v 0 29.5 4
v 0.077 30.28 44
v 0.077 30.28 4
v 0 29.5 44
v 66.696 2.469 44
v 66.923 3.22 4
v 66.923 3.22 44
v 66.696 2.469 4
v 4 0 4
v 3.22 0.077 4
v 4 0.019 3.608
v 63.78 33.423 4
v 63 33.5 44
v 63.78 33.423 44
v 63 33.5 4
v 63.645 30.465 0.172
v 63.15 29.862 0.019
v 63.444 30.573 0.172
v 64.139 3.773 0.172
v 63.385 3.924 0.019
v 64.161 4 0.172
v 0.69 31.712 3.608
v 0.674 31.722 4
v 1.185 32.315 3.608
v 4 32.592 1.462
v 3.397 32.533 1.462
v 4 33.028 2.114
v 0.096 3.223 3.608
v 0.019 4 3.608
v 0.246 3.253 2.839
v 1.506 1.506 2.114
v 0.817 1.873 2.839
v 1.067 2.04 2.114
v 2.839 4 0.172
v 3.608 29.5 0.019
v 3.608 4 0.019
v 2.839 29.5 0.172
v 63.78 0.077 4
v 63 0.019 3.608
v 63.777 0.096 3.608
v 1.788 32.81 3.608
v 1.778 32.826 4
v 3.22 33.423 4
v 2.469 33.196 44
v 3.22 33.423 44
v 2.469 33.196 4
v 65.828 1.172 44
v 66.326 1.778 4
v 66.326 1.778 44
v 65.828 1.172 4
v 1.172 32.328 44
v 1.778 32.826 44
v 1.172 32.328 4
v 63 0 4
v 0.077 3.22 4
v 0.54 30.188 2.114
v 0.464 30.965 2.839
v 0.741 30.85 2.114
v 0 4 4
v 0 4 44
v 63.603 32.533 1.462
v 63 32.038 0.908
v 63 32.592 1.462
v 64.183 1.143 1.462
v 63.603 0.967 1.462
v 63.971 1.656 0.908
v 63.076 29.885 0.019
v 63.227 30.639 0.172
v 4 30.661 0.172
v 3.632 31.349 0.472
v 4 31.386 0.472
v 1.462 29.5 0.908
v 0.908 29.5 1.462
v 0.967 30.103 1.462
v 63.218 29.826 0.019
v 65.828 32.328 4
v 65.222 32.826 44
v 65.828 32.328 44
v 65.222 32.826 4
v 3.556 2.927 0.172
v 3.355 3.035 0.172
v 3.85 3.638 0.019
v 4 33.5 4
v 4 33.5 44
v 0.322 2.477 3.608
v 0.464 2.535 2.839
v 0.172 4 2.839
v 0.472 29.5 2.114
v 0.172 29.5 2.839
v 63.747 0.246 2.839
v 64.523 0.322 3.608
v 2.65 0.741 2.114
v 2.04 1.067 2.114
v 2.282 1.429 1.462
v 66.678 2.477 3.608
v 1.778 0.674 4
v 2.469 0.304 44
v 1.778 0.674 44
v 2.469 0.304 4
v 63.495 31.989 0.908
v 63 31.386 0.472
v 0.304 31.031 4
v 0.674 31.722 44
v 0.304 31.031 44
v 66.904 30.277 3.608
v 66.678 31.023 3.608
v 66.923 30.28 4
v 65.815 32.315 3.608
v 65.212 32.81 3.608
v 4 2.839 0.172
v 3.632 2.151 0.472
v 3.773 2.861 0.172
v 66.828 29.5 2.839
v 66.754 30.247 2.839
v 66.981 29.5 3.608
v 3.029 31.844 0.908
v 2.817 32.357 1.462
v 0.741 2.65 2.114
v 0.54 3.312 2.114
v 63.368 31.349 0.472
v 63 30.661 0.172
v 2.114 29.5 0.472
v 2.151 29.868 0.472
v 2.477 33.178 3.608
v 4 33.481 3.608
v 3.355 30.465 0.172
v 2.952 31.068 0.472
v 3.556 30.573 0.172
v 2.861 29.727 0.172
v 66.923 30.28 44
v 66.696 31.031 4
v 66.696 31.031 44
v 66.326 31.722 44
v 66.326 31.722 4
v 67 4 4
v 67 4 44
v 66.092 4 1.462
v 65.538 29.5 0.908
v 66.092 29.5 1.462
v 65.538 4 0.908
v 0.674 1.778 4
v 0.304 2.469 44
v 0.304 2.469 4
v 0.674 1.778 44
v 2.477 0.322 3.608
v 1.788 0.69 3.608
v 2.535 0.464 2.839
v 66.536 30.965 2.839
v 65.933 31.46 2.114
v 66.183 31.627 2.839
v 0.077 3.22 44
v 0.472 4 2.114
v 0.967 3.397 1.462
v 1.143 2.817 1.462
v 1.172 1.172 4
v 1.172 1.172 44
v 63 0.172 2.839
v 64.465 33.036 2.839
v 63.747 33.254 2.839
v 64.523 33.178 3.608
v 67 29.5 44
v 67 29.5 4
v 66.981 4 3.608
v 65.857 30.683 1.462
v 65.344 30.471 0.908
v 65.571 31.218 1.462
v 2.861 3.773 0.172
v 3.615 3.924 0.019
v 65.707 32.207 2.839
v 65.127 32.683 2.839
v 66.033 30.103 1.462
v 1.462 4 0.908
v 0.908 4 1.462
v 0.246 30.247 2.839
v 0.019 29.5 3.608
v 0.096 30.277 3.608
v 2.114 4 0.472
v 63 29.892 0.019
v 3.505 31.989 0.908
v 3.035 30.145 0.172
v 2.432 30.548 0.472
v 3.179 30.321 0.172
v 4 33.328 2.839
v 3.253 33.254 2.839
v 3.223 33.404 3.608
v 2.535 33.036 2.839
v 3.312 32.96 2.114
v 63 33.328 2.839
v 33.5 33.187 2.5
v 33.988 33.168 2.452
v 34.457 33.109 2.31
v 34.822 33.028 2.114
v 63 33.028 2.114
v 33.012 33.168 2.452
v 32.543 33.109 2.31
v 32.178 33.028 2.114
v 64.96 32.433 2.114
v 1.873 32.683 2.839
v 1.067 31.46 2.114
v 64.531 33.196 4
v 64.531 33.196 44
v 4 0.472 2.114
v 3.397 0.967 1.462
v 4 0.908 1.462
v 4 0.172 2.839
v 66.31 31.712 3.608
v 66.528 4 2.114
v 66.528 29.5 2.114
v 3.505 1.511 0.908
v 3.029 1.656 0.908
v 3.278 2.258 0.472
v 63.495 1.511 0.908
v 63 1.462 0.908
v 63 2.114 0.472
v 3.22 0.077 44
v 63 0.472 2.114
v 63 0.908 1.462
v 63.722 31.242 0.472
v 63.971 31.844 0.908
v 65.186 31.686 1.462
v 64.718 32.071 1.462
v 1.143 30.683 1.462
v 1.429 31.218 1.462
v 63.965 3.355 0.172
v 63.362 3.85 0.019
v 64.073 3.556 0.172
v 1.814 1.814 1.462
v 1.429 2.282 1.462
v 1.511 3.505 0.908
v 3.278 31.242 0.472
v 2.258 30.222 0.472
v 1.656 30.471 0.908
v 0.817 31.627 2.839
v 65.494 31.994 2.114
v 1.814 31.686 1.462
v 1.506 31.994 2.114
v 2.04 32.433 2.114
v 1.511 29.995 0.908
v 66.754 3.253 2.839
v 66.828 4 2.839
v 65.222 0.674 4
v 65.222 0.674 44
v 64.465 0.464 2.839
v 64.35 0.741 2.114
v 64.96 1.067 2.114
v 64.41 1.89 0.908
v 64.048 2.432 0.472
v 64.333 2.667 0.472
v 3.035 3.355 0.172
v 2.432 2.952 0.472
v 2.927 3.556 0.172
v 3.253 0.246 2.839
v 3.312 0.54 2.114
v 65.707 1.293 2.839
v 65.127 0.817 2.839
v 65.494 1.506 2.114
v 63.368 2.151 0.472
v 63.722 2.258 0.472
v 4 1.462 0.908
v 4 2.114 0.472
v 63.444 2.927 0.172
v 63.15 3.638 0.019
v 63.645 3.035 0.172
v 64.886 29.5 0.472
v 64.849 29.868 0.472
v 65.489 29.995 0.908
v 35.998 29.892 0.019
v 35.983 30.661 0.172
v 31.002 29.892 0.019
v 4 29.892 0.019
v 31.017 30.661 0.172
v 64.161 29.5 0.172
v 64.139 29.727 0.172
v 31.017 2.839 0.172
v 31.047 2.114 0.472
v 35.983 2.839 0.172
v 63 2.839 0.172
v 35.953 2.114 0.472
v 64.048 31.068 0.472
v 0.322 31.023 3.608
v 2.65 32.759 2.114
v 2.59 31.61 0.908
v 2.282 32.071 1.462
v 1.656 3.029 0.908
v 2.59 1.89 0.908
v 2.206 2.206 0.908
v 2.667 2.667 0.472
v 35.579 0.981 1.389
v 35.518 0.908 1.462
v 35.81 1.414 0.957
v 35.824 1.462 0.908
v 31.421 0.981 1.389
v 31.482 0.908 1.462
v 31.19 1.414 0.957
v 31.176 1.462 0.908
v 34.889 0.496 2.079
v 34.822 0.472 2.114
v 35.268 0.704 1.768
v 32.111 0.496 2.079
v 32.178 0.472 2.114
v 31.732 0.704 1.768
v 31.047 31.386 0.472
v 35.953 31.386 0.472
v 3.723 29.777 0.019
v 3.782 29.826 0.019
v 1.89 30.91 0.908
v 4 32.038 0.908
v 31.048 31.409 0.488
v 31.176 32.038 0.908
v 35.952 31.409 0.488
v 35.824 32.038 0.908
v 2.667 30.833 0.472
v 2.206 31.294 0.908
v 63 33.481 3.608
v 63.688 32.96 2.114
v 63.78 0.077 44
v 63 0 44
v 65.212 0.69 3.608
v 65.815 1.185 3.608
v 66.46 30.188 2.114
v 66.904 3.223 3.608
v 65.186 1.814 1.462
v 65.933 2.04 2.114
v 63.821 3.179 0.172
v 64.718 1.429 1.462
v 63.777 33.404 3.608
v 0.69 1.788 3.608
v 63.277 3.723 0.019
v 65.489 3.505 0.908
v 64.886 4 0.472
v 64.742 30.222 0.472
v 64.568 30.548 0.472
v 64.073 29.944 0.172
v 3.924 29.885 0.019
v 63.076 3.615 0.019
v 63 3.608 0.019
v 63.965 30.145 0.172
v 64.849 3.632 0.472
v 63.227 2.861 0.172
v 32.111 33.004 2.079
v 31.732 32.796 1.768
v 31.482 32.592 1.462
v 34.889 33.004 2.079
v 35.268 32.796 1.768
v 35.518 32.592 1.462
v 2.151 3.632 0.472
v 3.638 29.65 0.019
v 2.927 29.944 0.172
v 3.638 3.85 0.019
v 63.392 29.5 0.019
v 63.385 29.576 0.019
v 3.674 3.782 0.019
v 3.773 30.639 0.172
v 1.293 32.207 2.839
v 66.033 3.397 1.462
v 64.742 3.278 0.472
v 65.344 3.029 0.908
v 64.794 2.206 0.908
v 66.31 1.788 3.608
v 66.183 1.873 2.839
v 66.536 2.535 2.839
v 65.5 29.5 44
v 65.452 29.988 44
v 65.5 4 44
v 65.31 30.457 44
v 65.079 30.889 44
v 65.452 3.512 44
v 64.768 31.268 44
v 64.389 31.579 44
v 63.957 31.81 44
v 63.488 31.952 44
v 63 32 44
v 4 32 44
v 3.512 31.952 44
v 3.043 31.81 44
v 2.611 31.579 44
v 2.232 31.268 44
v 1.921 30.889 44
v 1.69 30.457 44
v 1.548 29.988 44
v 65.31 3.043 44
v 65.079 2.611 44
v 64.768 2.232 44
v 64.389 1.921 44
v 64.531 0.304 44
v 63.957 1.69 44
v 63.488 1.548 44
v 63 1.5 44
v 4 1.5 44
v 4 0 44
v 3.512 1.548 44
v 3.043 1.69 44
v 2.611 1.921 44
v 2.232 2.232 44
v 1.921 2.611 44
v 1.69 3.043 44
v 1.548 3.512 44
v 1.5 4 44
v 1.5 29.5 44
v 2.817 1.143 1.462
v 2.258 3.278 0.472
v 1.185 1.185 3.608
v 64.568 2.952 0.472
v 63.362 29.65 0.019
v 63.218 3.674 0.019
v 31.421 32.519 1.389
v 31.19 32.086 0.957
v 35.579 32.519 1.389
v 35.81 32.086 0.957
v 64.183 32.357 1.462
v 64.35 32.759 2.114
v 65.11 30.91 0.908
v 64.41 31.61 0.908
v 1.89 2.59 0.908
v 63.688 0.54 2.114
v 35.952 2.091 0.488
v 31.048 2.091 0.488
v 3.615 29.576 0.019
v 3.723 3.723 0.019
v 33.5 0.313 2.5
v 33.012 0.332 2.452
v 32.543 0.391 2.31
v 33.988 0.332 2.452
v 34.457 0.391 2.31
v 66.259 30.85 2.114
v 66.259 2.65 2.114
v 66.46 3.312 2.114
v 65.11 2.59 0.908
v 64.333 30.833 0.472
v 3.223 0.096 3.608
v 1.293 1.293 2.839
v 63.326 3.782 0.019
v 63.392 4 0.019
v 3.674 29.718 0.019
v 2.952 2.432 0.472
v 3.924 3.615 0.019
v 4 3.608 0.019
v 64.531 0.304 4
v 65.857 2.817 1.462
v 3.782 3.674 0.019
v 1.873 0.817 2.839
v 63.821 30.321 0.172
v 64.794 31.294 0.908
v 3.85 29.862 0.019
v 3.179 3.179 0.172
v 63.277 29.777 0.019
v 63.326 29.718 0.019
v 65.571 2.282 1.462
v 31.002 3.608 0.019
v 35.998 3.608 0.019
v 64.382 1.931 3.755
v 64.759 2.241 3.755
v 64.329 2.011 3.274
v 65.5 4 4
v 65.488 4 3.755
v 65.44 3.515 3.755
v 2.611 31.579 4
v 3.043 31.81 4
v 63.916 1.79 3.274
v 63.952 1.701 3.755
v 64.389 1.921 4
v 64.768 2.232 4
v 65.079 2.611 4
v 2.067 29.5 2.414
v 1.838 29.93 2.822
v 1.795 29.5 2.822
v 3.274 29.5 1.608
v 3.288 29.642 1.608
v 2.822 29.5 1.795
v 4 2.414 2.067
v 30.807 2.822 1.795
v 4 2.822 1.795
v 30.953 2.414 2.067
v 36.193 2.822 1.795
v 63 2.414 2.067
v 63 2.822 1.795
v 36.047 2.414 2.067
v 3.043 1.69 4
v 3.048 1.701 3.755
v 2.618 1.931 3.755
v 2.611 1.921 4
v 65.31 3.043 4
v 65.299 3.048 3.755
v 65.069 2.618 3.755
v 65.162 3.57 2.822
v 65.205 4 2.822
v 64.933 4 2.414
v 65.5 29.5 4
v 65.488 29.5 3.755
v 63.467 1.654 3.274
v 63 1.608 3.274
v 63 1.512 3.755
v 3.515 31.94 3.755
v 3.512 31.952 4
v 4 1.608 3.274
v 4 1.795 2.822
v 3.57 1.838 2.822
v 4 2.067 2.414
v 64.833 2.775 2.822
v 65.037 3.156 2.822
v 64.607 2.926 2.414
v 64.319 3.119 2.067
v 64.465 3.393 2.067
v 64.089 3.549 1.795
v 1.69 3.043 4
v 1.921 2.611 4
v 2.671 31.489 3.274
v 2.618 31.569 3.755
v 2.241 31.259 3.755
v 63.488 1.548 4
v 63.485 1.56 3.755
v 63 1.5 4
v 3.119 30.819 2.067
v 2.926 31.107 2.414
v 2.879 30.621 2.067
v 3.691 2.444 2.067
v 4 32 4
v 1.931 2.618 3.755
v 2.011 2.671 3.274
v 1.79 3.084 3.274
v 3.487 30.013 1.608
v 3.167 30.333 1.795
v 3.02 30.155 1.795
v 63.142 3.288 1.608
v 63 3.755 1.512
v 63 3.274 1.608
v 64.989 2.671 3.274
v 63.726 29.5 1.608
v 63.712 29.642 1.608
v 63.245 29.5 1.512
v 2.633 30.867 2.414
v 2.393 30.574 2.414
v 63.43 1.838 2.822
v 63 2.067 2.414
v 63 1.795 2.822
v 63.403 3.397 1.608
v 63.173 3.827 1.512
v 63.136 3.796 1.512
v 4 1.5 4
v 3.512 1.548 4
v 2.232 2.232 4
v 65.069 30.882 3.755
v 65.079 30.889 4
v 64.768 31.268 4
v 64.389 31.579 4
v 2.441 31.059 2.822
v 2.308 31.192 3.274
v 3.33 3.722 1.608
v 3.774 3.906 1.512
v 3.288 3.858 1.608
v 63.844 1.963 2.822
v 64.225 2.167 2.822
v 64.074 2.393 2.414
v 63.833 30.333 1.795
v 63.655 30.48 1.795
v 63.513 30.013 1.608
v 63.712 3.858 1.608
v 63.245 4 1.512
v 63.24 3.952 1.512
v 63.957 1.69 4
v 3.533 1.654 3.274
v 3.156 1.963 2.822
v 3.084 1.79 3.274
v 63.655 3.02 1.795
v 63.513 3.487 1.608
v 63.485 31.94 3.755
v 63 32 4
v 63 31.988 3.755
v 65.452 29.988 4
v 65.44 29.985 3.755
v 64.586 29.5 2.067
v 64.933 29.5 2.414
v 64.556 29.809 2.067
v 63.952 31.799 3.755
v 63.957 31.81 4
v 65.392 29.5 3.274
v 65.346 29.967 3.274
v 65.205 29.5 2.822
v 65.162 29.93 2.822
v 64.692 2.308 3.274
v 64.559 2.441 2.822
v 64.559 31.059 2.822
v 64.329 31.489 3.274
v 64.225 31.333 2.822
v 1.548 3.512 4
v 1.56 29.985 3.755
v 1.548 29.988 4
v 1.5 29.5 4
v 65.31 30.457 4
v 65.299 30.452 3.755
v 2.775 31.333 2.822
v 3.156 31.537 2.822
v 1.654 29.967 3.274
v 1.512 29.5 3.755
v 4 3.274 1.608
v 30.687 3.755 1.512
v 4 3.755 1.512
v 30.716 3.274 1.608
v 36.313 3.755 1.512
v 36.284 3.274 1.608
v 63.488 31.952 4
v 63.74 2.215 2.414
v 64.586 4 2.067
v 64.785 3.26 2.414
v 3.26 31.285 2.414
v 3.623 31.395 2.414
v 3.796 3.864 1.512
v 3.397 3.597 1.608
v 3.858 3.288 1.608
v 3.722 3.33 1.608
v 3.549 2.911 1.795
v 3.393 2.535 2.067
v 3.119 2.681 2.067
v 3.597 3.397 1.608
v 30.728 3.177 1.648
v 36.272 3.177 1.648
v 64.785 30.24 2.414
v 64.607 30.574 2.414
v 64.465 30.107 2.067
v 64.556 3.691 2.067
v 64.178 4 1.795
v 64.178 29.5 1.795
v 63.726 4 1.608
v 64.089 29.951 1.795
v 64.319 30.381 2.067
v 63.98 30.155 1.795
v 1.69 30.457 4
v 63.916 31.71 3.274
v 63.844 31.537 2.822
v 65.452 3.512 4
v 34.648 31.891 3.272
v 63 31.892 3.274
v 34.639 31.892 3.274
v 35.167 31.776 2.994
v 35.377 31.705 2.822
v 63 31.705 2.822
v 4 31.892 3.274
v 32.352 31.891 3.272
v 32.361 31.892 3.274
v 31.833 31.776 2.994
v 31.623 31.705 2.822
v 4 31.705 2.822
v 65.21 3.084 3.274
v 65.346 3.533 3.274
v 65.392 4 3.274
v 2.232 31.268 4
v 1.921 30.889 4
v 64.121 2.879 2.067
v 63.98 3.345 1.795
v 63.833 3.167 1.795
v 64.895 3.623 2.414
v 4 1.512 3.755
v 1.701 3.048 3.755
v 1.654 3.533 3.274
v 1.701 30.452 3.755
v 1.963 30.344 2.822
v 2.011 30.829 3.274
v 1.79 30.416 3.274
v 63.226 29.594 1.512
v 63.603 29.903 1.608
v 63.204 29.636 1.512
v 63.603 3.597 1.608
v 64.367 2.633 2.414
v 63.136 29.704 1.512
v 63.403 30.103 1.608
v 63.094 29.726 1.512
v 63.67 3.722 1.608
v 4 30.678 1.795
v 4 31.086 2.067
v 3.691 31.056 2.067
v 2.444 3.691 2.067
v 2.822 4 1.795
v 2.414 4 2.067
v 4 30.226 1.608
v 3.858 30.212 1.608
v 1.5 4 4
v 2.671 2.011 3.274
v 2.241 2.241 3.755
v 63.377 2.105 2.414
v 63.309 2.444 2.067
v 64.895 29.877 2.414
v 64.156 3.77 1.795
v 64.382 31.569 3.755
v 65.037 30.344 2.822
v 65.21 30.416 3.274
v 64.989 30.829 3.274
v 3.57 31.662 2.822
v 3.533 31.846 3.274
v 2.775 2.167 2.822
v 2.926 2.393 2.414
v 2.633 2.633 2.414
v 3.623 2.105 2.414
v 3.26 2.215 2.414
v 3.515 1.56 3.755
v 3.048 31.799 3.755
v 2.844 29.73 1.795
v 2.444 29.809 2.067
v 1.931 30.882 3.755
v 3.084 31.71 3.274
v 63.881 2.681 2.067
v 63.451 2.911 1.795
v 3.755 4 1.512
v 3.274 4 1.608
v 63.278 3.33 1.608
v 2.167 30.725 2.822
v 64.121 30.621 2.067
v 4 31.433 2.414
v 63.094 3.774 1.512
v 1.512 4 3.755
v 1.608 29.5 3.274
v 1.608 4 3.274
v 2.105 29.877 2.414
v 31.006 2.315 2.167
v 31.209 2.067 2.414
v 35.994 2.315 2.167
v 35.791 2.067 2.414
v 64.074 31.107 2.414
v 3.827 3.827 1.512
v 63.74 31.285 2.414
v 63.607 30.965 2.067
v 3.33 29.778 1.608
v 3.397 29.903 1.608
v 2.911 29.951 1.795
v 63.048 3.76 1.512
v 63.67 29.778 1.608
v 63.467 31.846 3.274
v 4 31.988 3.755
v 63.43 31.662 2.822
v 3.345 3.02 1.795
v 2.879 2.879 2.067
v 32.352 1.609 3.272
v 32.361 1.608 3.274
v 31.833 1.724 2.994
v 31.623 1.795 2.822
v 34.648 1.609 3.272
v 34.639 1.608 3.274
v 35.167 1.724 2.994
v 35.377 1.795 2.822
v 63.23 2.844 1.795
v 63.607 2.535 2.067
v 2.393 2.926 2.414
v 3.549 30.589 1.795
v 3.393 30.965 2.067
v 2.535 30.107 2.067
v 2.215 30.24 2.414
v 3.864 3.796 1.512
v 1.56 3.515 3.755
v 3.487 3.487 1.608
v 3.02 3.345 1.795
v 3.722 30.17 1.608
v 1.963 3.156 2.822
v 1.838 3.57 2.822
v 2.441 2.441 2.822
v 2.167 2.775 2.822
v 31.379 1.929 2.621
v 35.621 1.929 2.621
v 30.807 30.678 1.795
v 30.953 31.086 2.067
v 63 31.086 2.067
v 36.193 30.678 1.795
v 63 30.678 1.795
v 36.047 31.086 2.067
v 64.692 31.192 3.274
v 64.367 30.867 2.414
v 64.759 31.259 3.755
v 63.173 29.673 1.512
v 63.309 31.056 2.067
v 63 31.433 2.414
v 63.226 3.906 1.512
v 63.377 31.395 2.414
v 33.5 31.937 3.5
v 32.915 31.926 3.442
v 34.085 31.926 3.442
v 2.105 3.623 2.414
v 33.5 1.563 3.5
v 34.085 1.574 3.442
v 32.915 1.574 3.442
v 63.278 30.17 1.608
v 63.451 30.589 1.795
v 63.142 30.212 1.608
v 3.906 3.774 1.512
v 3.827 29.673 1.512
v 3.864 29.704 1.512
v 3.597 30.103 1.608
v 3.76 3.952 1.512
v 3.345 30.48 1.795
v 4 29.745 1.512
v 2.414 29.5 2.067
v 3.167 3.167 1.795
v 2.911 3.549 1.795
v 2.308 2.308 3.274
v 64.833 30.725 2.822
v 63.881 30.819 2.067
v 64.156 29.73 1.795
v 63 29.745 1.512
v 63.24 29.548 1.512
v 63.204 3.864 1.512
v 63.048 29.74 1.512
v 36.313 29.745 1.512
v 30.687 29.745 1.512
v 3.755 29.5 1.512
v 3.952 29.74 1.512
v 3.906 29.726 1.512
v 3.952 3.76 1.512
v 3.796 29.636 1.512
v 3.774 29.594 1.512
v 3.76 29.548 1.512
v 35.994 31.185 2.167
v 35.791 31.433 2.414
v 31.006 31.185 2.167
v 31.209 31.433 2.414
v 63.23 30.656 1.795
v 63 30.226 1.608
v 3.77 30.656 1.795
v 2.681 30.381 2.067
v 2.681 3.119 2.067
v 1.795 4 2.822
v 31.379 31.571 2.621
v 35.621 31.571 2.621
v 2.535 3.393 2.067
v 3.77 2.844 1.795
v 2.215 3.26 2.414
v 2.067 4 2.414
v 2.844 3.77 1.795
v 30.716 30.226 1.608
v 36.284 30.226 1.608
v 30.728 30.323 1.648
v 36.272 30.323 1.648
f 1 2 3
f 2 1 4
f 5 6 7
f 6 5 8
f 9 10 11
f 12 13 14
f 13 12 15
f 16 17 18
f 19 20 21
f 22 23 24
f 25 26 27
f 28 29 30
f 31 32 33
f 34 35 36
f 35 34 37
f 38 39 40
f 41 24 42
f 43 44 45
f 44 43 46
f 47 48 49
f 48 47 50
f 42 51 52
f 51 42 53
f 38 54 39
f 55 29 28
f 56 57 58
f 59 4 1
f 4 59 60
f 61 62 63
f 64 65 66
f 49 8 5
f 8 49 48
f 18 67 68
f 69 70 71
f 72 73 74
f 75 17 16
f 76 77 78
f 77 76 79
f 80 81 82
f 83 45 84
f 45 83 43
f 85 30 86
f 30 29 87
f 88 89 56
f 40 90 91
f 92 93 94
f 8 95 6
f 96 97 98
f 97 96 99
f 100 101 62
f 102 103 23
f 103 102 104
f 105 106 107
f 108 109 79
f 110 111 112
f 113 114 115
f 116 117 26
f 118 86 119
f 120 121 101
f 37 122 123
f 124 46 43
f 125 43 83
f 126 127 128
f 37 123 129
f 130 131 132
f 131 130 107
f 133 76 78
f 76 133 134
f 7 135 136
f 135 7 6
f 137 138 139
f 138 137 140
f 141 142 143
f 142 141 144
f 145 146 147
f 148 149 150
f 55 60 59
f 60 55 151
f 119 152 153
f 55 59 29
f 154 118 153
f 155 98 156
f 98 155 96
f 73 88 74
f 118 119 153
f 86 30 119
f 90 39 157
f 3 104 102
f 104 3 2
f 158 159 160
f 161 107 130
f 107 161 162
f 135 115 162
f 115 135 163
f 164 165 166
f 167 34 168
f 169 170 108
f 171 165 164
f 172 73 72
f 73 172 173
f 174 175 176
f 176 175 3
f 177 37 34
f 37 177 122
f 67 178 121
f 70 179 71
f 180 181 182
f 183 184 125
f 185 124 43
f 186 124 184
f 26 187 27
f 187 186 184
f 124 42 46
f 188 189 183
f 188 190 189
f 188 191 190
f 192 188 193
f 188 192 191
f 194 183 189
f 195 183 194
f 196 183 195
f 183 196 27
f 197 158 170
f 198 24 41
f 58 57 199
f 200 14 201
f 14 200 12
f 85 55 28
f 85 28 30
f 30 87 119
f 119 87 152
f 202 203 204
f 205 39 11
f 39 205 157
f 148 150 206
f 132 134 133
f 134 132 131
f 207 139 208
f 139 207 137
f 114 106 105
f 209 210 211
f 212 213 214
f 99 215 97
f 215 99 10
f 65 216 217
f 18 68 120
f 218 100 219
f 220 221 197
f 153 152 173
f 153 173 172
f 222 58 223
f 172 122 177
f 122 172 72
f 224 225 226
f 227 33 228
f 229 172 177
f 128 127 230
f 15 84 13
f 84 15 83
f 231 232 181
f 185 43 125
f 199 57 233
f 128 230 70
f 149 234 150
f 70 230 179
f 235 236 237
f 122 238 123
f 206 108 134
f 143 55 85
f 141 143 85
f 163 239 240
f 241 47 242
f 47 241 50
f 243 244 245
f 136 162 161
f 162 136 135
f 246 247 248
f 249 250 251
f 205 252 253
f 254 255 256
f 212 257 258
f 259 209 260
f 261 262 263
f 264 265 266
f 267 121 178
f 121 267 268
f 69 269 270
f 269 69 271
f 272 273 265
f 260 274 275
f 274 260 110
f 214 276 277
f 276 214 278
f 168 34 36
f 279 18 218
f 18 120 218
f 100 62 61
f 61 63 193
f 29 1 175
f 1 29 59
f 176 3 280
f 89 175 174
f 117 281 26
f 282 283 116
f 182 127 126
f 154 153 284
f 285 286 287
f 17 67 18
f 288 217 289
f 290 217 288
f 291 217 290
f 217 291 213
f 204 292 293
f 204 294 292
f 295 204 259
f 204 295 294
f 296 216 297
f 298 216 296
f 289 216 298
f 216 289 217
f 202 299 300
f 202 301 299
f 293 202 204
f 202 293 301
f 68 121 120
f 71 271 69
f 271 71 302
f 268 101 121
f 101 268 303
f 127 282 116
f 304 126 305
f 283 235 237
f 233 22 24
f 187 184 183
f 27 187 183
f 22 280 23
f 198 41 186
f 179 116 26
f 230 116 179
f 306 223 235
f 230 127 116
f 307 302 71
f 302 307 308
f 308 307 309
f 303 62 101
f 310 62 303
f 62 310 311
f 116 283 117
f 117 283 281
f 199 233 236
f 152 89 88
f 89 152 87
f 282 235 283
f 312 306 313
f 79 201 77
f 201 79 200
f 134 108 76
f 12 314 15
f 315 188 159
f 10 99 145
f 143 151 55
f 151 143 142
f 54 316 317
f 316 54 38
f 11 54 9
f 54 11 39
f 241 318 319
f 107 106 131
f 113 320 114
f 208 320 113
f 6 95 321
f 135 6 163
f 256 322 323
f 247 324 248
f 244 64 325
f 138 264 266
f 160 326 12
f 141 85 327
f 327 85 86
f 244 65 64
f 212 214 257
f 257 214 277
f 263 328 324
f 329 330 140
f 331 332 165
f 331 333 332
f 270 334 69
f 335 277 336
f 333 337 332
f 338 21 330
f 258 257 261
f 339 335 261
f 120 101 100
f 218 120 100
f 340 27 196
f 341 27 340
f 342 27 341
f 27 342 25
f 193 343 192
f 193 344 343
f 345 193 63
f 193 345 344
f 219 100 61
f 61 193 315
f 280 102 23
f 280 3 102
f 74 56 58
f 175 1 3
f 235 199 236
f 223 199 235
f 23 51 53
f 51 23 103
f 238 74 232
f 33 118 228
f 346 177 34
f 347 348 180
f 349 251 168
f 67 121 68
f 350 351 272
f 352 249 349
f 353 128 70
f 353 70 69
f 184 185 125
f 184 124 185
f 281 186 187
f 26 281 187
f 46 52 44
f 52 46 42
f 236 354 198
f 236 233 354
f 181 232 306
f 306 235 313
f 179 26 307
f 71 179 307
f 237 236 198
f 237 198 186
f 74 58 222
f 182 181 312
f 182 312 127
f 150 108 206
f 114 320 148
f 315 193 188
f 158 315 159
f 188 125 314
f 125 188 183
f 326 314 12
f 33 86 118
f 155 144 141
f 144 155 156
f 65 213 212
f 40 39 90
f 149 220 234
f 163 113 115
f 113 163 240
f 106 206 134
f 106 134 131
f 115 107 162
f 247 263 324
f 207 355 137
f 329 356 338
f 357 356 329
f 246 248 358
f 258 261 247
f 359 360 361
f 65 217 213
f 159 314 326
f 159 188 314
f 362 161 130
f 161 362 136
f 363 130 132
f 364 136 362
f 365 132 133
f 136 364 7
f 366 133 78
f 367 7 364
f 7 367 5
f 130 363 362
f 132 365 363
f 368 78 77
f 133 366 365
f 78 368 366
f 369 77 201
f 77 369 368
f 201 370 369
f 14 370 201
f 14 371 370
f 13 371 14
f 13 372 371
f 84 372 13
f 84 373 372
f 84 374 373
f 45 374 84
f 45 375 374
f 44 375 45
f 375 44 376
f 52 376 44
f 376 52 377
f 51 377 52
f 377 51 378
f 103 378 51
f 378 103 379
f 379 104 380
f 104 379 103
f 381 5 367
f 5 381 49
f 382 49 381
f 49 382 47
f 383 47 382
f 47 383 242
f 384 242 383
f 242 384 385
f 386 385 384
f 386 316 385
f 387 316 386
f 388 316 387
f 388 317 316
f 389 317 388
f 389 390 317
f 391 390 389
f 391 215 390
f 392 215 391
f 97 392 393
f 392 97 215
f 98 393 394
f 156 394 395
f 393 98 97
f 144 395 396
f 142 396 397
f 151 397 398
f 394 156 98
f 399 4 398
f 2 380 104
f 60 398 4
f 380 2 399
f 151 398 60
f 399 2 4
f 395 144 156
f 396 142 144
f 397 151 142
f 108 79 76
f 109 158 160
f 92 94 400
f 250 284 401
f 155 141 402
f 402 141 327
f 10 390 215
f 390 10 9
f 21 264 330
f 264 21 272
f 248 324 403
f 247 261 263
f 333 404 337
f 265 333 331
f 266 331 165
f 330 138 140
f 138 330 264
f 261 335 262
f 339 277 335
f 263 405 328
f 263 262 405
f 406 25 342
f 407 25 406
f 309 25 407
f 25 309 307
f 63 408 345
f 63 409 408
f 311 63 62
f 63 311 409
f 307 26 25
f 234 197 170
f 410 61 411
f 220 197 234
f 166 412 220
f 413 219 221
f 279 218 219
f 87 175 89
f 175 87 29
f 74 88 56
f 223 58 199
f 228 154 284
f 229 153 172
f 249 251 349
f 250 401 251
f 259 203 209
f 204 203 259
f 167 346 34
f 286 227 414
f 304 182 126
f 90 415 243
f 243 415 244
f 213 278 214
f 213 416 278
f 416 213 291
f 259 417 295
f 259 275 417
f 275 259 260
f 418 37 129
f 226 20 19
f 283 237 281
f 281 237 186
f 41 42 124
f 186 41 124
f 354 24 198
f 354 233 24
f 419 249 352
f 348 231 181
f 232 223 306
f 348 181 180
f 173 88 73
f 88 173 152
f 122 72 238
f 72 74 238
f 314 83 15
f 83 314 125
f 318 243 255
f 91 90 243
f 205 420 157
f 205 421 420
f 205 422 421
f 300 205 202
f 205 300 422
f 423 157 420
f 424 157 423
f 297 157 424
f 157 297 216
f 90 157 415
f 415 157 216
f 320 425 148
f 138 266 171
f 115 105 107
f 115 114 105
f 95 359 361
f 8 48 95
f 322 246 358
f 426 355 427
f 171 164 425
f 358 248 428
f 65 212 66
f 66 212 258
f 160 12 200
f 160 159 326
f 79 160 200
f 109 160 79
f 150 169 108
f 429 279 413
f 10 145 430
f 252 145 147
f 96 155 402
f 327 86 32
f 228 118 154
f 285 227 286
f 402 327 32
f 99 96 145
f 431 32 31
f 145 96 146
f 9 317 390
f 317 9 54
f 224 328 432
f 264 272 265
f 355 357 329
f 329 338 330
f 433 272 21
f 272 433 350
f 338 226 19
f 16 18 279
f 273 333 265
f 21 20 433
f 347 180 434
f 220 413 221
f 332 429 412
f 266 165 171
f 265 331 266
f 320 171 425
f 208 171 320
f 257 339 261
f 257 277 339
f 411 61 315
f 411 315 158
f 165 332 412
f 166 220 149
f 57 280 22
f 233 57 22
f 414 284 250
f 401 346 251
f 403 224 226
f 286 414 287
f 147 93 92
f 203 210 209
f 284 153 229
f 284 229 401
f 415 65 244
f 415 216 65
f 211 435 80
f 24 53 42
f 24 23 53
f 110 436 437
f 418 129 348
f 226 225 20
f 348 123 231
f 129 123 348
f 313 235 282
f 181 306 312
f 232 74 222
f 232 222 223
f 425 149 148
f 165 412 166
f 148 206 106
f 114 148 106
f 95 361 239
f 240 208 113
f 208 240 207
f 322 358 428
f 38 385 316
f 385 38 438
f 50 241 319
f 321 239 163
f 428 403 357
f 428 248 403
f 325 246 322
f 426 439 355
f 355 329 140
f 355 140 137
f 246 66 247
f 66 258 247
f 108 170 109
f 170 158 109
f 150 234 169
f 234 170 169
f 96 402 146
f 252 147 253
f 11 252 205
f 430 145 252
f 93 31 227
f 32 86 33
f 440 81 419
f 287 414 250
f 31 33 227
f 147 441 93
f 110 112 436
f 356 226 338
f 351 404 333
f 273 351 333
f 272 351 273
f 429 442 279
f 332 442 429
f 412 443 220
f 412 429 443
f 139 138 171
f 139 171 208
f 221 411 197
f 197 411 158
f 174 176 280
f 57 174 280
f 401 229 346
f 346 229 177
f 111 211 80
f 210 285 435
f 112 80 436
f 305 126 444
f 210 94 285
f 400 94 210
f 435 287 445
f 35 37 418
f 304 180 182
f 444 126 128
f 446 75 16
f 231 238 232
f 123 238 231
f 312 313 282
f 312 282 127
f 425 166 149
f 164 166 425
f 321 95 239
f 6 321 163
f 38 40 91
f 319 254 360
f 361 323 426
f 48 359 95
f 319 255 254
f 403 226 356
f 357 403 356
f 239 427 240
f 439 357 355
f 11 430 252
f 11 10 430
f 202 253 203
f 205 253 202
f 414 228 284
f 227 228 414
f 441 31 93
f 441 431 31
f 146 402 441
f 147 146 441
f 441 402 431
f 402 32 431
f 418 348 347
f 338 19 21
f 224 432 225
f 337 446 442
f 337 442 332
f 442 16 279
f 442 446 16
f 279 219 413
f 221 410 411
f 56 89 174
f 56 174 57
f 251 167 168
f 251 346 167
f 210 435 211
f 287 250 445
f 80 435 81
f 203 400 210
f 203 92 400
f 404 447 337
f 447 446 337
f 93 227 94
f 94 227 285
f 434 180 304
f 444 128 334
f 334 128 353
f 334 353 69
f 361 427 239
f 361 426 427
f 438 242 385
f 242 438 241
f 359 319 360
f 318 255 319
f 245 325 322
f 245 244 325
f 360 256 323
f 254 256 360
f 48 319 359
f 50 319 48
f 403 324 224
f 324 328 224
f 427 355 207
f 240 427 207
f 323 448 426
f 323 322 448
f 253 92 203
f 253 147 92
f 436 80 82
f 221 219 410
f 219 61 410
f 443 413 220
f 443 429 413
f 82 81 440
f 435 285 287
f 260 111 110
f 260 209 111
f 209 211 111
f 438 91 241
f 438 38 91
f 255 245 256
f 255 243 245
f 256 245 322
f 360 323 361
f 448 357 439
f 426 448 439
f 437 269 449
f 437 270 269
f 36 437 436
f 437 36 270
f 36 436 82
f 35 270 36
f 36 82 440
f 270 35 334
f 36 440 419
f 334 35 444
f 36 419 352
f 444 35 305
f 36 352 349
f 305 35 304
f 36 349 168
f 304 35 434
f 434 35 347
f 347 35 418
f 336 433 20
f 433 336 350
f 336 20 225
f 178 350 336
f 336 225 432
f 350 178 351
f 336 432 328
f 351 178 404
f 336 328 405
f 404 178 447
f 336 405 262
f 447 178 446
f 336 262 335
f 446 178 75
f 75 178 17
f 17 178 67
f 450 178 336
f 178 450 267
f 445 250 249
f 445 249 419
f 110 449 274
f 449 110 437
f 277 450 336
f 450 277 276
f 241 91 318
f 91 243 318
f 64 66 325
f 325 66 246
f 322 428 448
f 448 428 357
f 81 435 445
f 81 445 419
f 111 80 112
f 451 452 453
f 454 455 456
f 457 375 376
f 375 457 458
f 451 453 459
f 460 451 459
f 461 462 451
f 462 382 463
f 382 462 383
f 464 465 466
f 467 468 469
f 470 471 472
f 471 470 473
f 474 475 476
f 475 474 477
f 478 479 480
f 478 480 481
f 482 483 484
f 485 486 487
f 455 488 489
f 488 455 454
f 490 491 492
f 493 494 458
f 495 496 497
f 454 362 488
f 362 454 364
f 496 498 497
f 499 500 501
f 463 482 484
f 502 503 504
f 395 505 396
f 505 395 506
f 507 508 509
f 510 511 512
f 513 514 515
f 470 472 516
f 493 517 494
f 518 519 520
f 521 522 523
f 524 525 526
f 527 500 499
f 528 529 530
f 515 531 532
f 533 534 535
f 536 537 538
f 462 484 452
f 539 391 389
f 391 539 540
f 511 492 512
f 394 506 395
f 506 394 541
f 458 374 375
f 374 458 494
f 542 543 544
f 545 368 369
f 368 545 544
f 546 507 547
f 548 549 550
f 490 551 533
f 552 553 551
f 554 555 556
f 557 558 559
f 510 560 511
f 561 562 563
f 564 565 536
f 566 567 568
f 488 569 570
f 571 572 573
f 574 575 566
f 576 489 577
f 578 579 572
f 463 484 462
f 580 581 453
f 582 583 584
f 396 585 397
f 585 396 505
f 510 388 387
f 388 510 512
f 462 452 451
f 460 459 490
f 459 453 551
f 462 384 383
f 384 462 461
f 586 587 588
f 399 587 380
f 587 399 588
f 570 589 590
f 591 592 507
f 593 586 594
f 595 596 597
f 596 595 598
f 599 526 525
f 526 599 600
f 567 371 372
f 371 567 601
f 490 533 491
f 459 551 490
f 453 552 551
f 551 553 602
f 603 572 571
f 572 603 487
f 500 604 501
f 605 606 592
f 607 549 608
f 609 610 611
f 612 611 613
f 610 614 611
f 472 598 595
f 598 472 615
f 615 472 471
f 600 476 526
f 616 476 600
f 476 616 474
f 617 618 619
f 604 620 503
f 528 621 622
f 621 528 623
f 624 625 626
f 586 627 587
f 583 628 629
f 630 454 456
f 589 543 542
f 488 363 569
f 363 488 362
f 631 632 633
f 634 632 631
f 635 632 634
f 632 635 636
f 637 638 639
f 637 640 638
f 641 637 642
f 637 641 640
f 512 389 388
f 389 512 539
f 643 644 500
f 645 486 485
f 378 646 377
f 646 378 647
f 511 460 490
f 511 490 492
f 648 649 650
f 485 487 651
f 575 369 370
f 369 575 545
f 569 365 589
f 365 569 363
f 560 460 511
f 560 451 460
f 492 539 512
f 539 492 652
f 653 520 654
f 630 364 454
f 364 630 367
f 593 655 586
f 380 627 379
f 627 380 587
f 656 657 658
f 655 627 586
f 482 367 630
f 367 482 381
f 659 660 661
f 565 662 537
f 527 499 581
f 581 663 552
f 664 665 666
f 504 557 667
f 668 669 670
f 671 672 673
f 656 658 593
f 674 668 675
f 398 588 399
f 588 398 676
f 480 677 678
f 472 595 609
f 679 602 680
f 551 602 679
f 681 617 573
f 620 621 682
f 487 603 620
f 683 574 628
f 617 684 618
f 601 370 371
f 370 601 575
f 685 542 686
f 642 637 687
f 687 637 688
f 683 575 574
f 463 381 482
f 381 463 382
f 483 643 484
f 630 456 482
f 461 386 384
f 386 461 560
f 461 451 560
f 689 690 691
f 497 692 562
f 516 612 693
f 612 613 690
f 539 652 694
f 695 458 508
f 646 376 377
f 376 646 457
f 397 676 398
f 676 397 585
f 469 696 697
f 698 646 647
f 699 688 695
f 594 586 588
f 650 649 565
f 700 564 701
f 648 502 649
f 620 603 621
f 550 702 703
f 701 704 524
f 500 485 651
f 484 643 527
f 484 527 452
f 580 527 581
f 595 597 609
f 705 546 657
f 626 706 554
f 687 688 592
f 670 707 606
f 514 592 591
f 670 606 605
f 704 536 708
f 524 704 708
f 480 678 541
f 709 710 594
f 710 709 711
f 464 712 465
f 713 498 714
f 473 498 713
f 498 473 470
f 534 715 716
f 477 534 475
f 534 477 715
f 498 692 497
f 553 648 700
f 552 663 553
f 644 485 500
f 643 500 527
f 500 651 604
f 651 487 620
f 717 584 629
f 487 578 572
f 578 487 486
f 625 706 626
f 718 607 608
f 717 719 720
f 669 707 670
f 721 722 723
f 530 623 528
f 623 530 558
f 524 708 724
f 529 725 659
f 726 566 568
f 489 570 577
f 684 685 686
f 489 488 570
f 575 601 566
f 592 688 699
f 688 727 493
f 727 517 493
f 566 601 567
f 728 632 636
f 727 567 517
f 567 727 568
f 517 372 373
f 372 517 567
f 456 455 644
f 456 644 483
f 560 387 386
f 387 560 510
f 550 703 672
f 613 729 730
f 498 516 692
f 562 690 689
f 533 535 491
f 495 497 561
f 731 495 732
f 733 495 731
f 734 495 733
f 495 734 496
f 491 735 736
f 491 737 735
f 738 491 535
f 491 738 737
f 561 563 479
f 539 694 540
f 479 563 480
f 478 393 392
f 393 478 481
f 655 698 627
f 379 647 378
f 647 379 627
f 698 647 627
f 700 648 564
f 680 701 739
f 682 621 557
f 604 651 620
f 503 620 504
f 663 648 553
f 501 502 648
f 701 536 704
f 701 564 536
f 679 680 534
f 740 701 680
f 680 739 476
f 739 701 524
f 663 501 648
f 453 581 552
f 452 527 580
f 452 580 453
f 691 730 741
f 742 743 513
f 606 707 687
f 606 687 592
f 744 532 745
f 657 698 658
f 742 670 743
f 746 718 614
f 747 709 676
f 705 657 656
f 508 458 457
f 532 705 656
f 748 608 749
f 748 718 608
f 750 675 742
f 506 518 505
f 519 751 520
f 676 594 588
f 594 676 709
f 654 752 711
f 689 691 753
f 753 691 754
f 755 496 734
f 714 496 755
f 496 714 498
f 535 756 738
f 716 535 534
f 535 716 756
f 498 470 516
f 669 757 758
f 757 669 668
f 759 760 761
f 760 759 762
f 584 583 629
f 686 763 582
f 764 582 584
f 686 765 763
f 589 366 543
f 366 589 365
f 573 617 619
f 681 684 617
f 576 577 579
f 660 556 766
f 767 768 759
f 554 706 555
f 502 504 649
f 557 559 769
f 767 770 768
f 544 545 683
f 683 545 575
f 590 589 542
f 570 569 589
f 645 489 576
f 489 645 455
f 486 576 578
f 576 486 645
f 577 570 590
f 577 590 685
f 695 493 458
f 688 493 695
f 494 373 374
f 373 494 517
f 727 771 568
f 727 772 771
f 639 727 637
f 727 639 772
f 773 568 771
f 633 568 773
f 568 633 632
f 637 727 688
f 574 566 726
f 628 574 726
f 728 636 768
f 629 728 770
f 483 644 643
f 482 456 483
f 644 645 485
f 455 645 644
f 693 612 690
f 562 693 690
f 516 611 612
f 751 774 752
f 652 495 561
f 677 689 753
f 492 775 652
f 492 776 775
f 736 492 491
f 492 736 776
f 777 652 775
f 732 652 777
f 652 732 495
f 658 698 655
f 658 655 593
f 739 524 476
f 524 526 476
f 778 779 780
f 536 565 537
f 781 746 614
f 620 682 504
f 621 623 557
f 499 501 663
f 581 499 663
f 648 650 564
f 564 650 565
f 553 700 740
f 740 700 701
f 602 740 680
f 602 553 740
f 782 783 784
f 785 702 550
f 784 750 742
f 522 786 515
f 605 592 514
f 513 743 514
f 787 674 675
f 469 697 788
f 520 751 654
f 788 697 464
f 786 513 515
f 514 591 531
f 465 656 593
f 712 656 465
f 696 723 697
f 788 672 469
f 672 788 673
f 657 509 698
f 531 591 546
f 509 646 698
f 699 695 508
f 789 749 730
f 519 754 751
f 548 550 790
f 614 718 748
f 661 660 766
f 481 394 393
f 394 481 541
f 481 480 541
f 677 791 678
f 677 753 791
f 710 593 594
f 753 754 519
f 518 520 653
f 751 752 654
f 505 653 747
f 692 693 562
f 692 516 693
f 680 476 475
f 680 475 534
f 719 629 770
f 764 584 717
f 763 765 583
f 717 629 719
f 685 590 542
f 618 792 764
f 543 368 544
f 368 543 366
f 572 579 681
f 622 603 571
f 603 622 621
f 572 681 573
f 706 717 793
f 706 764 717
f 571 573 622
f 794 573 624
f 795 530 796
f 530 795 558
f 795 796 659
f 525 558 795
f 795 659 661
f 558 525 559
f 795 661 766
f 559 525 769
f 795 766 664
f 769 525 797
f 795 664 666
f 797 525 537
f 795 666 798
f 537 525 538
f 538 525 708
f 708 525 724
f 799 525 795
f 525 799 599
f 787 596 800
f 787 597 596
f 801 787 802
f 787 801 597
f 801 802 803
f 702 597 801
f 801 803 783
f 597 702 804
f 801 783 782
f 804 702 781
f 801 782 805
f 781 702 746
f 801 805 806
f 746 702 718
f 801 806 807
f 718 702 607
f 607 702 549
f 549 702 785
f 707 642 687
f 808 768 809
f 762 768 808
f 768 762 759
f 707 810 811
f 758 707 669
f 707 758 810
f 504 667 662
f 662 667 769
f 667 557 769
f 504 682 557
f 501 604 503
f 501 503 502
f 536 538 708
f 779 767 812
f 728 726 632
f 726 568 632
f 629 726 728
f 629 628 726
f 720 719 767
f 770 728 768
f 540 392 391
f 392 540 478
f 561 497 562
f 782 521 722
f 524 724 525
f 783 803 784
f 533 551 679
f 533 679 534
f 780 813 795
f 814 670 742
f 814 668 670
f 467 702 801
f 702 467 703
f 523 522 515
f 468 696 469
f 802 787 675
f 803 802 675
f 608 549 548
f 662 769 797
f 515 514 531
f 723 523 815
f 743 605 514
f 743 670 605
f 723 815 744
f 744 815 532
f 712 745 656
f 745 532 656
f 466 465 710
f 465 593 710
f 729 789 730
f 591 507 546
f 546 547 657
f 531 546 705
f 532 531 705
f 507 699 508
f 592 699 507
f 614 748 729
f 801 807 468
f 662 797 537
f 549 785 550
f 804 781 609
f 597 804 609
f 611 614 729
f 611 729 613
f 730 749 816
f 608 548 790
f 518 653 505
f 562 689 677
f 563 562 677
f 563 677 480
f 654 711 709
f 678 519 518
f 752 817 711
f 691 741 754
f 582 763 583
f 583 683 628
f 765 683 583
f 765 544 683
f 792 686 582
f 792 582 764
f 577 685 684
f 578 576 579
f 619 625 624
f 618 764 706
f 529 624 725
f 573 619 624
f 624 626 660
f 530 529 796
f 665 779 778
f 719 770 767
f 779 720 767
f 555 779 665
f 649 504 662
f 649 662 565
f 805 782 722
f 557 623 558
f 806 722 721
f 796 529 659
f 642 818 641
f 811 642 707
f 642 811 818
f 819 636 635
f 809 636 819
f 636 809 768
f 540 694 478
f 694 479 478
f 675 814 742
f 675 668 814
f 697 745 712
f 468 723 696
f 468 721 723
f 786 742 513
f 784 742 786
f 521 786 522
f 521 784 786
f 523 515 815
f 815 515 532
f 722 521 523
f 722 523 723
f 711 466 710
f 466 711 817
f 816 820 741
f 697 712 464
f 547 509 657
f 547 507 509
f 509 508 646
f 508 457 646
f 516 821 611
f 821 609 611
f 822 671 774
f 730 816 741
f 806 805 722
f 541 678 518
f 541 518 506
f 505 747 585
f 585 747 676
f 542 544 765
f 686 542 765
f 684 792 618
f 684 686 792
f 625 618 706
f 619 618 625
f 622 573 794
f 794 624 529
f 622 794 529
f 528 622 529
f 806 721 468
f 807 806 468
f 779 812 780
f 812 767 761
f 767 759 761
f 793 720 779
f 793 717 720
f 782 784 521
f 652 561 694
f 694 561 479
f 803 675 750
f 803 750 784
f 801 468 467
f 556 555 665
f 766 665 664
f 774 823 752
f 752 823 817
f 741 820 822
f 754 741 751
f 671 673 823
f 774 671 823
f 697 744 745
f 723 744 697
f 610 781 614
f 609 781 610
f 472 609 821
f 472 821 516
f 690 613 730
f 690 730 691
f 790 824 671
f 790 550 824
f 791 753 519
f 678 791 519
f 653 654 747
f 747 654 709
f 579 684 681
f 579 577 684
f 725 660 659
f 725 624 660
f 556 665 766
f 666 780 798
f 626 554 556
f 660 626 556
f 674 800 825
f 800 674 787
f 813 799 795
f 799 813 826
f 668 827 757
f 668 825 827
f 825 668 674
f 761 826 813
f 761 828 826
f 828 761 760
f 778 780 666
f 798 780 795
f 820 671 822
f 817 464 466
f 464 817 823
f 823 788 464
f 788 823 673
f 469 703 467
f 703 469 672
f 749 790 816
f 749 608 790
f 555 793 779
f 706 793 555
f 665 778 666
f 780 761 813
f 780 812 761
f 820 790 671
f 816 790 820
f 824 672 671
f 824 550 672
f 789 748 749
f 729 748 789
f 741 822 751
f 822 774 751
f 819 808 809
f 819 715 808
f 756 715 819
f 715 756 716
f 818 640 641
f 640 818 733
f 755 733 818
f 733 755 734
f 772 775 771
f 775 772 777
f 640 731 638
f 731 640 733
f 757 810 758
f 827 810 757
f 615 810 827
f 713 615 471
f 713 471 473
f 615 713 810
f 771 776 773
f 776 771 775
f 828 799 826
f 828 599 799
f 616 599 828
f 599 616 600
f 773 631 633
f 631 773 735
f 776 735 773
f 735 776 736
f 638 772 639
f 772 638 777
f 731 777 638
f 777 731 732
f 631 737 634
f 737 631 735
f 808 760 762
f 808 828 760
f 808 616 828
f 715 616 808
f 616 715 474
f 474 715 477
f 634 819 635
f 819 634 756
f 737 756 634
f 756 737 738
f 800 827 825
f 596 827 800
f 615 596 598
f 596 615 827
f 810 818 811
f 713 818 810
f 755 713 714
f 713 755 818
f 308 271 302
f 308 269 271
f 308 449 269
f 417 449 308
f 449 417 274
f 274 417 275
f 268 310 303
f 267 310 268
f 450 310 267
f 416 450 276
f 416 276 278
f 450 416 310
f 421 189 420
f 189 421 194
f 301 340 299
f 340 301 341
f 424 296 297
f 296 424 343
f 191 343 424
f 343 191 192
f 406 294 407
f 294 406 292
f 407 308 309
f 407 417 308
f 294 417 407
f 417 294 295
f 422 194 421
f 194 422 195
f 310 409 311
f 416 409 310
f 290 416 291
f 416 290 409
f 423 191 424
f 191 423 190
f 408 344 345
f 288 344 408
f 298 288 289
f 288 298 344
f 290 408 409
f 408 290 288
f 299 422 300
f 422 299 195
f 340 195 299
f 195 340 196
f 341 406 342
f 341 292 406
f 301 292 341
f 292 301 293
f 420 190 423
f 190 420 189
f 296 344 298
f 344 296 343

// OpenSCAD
union() {
	difference() {
		union() {
			difference() {
				hull() {
					translate(v = [4, 4, 4]) {
						cylinder($fn = 32, h = 40, r = 4);
						sphere($fn = 32, r = 4);
					}
					translate(v = [63, 4, 4]) {
						cylinder($fn = 32, h = 40, r = 4);
						sphere($fn = 32, r = 4);
					}
					translate(v = [4, 29.5000000000, 4]) {
						cylinder($fn = 32, h = 40, r = 4);
						sphere($fn = 32, r = 4);
					}
					translate(v = [63, 29.5000000000, 4]) {
						cylinder($fn = 32, h = 40, r = 4);
						sphere($fn = 32, r = 4);
					}
				}
				translate(v = [1.5000000000, 1.5000000000, 1.5000000000]) {
					hull() {
						translate(v = [2.5000000000, 2.5000000000, 2.5000000000]) {
							cylinder($fn = 32, h = 41.5000000000, r = 2.5000000000);
							sphere($fn = 32, r = 2.5000000000);
						}
						translate(v = [61.5000000000, 2.5000000000, 2.5000000000]) {
							cylinder($fn = 32, h = 41.5000000000, r = 2.5000000000);
							sphere($fn = 32, r = 2.5000000000);
						}
						translate(v = [2.5000000000, 28.0000000000, 2.5000000000]) {
							cylinder($fn = 32, h = 41.5000000000, r = 2.5000000000);
							sphere($fn = 32, r = 2.5000000000);
						}
						translate(v = [61.5000000000, 28.0000000000, 2.5000000000]) {
							cylinder($fn = 32, h = 41.5000000000, r = 2.5000000000);
							sphere($fn = 32, r = 2.5000000000);
						}
					}
				}
			}
			intersection() {
				translate(v = [33.5000000000, 0, 0.5000000000]) {
					rotate(a = [-90, 0, 0]) {
						cylinder($fn = 32, h = 33.5000000000, r = 3.0000000000);
					}
				}
				hull() {
					translate(v = [4, 4, 4]) {
						cylinder($fn = 32, h = 40, r = 4);
						sphere($fn = 32, r = 4);
					}
					translate(v = [63, 4, 4]) {
						cylinder($fn = 32, h = 40, r = 4);
						sphere($fn = 32, r = 4);
					}
					translate(v = [4, 29.5000000000, 4]) {
						cylinder($fn = 32, h = 40, r = 4);
						sphere($fn = 32, r = 4);
					}
					translate(v = [63, 29.5000000000, 4]) {
						cylinder($fn = 32, h = 40, r = 4);
						sphere($fn = 32, r = 4);
					}
				}
			}
		}
		translate(v = [33.5000000000, 0, 0]) {
			rotate(a = [-90, 0, 0]) {
				cylinder($fn = 32, h = 33.5000000000, r = 2.5000000000);
			}
		}
	}
}
